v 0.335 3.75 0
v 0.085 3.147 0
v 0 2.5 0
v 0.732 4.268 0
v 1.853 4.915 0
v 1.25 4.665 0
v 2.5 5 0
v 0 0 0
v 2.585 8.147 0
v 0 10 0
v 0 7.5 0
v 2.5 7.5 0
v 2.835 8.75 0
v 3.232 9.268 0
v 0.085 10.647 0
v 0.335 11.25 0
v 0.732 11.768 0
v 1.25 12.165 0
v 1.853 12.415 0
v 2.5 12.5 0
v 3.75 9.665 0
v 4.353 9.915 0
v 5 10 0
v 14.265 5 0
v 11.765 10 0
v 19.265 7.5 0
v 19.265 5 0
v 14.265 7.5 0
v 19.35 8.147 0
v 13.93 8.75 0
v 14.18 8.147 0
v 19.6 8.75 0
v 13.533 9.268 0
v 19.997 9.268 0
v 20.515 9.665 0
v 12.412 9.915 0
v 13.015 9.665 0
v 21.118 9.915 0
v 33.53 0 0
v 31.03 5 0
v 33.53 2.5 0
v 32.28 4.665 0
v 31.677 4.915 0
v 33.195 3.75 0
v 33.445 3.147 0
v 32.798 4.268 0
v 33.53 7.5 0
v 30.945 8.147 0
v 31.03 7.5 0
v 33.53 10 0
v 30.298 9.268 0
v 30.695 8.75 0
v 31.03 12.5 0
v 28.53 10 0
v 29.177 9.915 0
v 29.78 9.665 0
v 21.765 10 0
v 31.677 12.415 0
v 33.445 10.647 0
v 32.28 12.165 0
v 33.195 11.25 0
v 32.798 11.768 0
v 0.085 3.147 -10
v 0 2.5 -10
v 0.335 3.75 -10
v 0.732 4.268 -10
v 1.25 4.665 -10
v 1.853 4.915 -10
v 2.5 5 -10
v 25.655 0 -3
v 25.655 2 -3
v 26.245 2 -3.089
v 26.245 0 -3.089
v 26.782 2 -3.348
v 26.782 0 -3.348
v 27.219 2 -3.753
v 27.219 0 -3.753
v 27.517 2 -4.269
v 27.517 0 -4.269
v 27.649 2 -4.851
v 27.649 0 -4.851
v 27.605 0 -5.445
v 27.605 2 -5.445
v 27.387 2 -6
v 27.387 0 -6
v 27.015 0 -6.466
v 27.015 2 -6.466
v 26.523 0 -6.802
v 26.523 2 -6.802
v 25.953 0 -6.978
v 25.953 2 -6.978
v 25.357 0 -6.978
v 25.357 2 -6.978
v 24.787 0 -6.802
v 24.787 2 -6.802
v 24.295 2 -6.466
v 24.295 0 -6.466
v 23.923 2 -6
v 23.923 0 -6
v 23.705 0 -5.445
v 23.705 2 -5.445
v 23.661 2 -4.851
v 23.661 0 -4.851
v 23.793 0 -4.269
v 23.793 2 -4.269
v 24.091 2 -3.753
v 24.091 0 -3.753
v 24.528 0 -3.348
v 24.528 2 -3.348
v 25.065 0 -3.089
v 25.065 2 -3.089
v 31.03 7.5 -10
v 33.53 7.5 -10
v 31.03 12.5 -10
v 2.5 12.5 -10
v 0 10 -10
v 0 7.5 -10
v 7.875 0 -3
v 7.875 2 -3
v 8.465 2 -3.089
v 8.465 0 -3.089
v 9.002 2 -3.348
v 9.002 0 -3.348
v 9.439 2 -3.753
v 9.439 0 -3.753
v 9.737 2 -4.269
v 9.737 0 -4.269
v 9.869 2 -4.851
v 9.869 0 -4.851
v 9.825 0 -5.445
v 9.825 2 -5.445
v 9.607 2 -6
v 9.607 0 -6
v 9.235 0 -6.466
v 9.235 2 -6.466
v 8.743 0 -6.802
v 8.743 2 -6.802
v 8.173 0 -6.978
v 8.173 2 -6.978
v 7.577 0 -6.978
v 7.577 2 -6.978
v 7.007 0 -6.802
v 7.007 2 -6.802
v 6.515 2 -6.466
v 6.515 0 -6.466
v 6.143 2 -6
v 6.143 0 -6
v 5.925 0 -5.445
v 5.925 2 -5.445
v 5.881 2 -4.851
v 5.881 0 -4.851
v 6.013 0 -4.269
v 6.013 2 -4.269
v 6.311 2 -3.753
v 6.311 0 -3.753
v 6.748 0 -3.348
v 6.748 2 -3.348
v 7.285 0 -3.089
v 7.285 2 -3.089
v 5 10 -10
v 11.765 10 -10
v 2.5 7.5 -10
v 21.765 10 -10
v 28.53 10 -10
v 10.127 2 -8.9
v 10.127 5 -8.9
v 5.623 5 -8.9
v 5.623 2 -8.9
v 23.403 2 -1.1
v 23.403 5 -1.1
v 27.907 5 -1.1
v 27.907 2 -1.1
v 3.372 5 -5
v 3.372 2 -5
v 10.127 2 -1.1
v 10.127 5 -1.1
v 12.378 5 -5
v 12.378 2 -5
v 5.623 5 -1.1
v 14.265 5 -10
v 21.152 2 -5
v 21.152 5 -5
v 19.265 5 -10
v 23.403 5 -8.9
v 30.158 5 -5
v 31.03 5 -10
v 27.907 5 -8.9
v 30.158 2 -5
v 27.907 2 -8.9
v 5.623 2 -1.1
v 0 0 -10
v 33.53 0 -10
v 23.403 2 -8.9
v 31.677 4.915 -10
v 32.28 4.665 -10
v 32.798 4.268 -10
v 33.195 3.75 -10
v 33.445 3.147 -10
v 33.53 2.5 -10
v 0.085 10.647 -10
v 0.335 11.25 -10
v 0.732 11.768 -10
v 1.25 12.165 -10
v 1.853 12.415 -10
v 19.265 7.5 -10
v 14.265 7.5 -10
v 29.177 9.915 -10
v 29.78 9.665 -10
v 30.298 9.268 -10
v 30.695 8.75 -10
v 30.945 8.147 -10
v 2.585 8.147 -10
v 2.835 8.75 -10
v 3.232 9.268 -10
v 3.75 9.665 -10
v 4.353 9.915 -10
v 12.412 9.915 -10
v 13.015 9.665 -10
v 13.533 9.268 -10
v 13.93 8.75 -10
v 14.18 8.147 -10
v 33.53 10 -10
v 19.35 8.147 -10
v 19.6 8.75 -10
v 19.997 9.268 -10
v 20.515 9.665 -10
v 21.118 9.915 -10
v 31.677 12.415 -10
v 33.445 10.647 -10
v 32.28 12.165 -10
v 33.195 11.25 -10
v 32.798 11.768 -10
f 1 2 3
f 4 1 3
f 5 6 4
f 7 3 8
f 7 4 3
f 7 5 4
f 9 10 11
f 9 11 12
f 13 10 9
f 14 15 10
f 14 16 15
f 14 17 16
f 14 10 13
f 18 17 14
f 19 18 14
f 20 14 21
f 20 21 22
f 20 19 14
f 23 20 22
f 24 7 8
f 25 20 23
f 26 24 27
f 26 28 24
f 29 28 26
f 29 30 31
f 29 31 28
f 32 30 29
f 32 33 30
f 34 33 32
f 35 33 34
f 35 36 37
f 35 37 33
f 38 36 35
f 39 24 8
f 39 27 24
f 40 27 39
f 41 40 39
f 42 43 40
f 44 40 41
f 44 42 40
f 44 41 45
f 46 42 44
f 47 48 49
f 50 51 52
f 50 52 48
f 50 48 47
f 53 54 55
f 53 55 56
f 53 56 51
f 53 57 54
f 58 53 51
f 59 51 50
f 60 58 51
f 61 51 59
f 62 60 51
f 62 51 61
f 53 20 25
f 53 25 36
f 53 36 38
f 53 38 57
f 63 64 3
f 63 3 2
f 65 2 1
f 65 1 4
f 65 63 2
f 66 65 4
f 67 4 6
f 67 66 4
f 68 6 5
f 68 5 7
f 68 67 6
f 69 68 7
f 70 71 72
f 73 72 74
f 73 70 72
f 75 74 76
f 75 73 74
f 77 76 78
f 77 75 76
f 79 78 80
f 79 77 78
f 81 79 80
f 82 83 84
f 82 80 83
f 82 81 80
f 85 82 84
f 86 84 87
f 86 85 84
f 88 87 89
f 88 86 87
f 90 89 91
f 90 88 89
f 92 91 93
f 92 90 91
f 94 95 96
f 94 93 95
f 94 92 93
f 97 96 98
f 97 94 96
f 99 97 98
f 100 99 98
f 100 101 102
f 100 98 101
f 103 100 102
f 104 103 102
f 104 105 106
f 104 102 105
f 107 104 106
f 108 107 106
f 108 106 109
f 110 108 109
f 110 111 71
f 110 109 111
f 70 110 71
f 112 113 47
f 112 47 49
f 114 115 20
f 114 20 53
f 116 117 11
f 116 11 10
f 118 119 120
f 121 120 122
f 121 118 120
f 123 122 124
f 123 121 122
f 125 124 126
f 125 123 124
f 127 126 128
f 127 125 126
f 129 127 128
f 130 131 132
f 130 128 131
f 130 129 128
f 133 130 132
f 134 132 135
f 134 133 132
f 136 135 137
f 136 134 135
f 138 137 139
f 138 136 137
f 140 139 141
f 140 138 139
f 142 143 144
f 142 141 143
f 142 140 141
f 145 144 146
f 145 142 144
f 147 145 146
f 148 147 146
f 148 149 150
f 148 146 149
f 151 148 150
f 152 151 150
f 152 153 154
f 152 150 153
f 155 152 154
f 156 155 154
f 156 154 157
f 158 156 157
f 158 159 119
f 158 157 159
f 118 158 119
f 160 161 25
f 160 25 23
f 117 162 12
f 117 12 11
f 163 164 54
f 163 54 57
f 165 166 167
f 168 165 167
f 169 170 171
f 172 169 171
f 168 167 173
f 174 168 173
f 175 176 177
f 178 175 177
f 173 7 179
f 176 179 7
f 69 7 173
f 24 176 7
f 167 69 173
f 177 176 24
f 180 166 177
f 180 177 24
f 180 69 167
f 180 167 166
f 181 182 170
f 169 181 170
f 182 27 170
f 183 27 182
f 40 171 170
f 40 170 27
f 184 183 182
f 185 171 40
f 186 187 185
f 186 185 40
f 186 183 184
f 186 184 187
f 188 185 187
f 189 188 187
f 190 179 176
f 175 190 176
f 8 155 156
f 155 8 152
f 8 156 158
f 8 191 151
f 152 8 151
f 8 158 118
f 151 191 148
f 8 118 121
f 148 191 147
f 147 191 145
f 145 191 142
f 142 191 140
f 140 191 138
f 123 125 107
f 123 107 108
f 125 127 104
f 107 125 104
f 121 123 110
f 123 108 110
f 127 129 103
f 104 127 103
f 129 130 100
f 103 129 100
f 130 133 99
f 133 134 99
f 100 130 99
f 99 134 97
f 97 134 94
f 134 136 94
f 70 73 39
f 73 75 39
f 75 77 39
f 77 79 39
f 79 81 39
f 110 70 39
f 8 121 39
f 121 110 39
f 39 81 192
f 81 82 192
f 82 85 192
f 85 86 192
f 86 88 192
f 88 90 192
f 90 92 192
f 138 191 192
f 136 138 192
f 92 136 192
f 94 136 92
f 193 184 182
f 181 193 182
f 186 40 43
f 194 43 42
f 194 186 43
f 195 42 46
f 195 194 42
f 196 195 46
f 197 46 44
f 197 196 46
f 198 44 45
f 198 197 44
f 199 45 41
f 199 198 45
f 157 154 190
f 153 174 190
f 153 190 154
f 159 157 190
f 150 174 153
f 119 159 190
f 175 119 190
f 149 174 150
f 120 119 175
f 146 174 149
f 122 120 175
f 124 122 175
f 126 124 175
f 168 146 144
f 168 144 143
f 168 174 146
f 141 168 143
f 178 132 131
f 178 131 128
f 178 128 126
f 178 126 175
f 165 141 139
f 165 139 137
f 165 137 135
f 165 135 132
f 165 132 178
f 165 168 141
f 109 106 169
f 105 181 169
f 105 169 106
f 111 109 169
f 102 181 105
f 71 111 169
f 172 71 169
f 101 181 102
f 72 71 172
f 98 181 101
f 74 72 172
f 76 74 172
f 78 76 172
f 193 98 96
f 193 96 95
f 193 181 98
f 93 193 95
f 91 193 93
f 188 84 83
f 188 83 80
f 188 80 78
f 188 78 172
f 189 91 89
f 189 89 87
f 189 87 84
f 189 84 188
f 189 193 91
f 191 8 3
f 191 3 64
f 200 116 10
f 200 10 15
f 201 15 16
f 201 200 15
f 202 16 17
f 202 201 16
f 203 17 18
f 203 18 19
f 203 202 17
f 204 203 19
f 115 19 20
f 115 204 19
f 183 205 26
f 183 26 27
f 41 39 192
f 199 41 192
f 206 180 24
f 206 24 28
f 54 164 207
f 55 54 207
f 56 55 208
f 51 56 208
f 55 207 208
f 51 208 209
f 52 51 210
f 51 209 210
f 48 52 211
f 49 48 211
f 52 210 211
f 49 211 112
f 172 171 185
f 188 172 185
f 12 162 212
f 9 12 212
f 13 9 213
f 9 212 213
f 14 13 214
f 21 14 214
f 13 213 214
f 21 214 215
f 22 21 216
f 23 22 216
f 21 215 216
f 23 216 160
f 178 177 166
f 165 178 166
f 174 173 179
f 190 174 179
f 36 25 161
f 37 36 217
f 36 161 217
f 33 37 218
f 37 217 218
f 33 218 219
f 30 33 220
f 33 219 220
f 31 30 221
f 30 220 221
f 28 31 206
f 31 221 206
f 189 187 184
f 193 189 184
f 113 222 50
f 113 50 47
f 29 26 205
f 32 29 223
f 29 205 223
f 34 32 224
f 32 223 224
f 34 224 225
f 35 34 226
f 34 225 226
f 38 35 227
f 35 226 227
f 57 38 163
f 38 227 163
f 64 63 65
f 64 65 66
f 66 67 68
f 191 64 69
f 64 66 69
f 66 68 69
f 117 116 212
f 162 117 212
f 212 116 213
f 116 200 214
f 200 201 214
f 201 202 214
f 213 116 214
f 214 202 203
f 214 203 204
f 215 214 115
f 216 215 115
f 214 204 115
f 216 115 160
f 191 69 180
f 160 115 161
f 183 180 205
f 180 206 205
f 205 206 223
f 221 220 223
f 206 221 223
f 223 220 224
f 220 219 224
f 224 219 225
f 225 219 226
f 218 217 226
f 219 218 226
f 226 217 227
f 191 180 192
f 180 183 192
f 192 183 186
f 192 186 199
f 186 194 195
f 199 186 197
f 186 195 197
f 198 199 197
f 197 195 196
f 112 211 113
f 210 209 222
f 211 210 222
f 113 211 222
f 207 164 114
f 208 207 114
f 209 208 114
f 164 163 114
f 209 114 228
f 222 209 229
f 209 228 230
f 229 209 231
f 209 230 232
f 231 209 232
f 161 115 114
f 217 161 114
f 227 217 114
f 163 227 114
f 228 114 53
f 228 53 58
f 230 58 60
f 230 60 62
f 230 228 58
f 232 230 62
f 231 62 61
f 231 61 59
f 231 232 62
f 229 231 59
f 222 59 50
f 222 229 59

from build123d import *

# Parameters (mm, degrees)
SKETCH2_W           = 33.53
SKETCH2_H           = 10
SKETCH2_R           = 2
BOSS_EXTRUDE1_DEPTH = 5
CUT_EXTRUDE1_DEPTH  = 3
BOSS_EXTRUDE2_DEPTH = 10
FILLET1_START       = -11
FILLET1_DEPTH       = 12
FILLET1_START_2     = -10
FILLET1_2_DEPTH     = 10


with BuildPart() as part:
    # Sketch2 → Boss-Extrude1 (new body)
    with BuildSketch(Plane(origin=(0, 0, 0), x_dir=(1, 0, 0), z_dir=(0, 1, 0))):
        with Locations((16.765, 5)):
            Rectangle(SKETCH2_W, SKETCH2_H)
        with Locations(Location((7.875, 5, 0), (0, 0, 270))):
            Circle(SKETCH2_R, mode=Mode.SUBTRACT)
        with Locations(Location((25.655, 5, 0), (0, 0, 270))):
            Circle(SKETCH2_R, mode=Mode.SUBTRACT)
    extrude(amount=BOSS_EXTRUDE1_DEPTH)

    # Sketch3 → Cut-Extrude1 (cut)
    with BuildSketch(Plane(origin=(0, 5, 0), x_dir=(1, 0, 0), z_dir=(0, 1, 0))):
        Polygon((12.3783321, 5), (10.12666605, 8.9), (5.62333395, 8.9), (3.3716679, 5), (5.62333395, 1.1), (10.12666605, 1.1), align=None)
        Polygon((30.1583321, 5), (27.90666605, 8.9), (23.40333395, 8.9), (21.1516679, 5), (23.40333395, 1.1), (27.90666605, 1.1), align=None)
    extrude(amount=-CUT_EXTRUDE1_DEPTH, mode=Mode.SUBTRACT)

    # Sketch4 → Boss-Extrude2 (add)
    with BuildSketch(Plane(origin=(0, 0, -10), x_dir=(-1, 0, 0), z_dir=(0, 0, -1))):
        Polygon((-14.265, 5), (-14.265, 10), (-2.5, 10), (-2.5, 7.5), (0, 7.5), (0, 12.5), (-33.53, 12.5), (-33.53, 7.5), (-31.03, 7.5), (-31.03, 10), (-19.265, 10), (-19.265, 5), align=None)
    extrude(amount=-BOSS_EXTRUDE2_DEPTH)

    # Fillet1: read off the stored shape, not the designer's step
    # Fillet1 outline → Fillet1 (cut)
    with BuildSketch(Plane.XY.offset(FILLET1_START)):
        with BuildLine():
            Line((33.53, 12.5), (31.03, 12.5))
            ThreePointArc((31.03, 12.5), (32.797766953, 11.767766953), (33.53, 10))
            Line((33.53, 10), (33.53, 12.5))
        make_face()
        with BuildLine():
            ThreePointArc((0, 10), (0.732233047, 11.767766953), (2.5, 12.5))
            Line((2.5, 12.5), (0, 12.5))
            Line((0, 12.5), (0, 10))
        make_face()
        with BuildLine():
            Line((33.53, 5), (31.03, 5))
            ThreePointArc((31.03, 5), (32.797766953, 4.267766953), (33.53, 2.5))
            Line((33.53, 2.5), (33.53, 5))
        make_face()
        with BuildLine():
            ThreePointArc((0, 2.5), (0.732233047, 4.267766953), (2.5, 5))
            Line((2.5, 5), (0, 5))
            Line((0, 5), (0, 2.5))
        make_face()
    extrude(amount=FILLET1_DEPTH, mode=Mode.SUBTRACT)

    # Fillet1 2 outline → Fillet1 2 (add)
    with BuildSketch(Plane.XY.offset(FILLET1_START_2)):
        with BuildLine():
            Line((31.03, 10), (28.53, 10))
            ThreePointArc((28.53, 10), (30.297766953, 9.267766953), (31.03, 7.5))
            Line((31.03, 7.5), (31.03, 10))
        make_face()
        with BuildLine():
            Line((19.265, 10), (19.265, 7.5))
            ThreePointArc((19.265, 7.5), (19.997233047, 9.267766953), (21.765, 10))
            Line((21.765, 10), (19.265, 10))
        make_face()
        with BuildLine():
            ThreePointArc((2.5, 7.5), (3.232233047, 9.267766953), (5, 10))
            Line((5, 10), (2.5, 10))
            Line((2.5, 10), (2.5, 7.5))
        make_face()
        with BuildLine():
            ThreePointArc((11.765, 10), (13.532766953, 9.267766953), (14.265, 7.5))
            Line((14.265, 7.5), (14.265, 10))
            Line((14.265, 10), (11.765, 10))
        make_face()
    extrude(amount=FILLET1_2_DEPTH)


solid = part.part
